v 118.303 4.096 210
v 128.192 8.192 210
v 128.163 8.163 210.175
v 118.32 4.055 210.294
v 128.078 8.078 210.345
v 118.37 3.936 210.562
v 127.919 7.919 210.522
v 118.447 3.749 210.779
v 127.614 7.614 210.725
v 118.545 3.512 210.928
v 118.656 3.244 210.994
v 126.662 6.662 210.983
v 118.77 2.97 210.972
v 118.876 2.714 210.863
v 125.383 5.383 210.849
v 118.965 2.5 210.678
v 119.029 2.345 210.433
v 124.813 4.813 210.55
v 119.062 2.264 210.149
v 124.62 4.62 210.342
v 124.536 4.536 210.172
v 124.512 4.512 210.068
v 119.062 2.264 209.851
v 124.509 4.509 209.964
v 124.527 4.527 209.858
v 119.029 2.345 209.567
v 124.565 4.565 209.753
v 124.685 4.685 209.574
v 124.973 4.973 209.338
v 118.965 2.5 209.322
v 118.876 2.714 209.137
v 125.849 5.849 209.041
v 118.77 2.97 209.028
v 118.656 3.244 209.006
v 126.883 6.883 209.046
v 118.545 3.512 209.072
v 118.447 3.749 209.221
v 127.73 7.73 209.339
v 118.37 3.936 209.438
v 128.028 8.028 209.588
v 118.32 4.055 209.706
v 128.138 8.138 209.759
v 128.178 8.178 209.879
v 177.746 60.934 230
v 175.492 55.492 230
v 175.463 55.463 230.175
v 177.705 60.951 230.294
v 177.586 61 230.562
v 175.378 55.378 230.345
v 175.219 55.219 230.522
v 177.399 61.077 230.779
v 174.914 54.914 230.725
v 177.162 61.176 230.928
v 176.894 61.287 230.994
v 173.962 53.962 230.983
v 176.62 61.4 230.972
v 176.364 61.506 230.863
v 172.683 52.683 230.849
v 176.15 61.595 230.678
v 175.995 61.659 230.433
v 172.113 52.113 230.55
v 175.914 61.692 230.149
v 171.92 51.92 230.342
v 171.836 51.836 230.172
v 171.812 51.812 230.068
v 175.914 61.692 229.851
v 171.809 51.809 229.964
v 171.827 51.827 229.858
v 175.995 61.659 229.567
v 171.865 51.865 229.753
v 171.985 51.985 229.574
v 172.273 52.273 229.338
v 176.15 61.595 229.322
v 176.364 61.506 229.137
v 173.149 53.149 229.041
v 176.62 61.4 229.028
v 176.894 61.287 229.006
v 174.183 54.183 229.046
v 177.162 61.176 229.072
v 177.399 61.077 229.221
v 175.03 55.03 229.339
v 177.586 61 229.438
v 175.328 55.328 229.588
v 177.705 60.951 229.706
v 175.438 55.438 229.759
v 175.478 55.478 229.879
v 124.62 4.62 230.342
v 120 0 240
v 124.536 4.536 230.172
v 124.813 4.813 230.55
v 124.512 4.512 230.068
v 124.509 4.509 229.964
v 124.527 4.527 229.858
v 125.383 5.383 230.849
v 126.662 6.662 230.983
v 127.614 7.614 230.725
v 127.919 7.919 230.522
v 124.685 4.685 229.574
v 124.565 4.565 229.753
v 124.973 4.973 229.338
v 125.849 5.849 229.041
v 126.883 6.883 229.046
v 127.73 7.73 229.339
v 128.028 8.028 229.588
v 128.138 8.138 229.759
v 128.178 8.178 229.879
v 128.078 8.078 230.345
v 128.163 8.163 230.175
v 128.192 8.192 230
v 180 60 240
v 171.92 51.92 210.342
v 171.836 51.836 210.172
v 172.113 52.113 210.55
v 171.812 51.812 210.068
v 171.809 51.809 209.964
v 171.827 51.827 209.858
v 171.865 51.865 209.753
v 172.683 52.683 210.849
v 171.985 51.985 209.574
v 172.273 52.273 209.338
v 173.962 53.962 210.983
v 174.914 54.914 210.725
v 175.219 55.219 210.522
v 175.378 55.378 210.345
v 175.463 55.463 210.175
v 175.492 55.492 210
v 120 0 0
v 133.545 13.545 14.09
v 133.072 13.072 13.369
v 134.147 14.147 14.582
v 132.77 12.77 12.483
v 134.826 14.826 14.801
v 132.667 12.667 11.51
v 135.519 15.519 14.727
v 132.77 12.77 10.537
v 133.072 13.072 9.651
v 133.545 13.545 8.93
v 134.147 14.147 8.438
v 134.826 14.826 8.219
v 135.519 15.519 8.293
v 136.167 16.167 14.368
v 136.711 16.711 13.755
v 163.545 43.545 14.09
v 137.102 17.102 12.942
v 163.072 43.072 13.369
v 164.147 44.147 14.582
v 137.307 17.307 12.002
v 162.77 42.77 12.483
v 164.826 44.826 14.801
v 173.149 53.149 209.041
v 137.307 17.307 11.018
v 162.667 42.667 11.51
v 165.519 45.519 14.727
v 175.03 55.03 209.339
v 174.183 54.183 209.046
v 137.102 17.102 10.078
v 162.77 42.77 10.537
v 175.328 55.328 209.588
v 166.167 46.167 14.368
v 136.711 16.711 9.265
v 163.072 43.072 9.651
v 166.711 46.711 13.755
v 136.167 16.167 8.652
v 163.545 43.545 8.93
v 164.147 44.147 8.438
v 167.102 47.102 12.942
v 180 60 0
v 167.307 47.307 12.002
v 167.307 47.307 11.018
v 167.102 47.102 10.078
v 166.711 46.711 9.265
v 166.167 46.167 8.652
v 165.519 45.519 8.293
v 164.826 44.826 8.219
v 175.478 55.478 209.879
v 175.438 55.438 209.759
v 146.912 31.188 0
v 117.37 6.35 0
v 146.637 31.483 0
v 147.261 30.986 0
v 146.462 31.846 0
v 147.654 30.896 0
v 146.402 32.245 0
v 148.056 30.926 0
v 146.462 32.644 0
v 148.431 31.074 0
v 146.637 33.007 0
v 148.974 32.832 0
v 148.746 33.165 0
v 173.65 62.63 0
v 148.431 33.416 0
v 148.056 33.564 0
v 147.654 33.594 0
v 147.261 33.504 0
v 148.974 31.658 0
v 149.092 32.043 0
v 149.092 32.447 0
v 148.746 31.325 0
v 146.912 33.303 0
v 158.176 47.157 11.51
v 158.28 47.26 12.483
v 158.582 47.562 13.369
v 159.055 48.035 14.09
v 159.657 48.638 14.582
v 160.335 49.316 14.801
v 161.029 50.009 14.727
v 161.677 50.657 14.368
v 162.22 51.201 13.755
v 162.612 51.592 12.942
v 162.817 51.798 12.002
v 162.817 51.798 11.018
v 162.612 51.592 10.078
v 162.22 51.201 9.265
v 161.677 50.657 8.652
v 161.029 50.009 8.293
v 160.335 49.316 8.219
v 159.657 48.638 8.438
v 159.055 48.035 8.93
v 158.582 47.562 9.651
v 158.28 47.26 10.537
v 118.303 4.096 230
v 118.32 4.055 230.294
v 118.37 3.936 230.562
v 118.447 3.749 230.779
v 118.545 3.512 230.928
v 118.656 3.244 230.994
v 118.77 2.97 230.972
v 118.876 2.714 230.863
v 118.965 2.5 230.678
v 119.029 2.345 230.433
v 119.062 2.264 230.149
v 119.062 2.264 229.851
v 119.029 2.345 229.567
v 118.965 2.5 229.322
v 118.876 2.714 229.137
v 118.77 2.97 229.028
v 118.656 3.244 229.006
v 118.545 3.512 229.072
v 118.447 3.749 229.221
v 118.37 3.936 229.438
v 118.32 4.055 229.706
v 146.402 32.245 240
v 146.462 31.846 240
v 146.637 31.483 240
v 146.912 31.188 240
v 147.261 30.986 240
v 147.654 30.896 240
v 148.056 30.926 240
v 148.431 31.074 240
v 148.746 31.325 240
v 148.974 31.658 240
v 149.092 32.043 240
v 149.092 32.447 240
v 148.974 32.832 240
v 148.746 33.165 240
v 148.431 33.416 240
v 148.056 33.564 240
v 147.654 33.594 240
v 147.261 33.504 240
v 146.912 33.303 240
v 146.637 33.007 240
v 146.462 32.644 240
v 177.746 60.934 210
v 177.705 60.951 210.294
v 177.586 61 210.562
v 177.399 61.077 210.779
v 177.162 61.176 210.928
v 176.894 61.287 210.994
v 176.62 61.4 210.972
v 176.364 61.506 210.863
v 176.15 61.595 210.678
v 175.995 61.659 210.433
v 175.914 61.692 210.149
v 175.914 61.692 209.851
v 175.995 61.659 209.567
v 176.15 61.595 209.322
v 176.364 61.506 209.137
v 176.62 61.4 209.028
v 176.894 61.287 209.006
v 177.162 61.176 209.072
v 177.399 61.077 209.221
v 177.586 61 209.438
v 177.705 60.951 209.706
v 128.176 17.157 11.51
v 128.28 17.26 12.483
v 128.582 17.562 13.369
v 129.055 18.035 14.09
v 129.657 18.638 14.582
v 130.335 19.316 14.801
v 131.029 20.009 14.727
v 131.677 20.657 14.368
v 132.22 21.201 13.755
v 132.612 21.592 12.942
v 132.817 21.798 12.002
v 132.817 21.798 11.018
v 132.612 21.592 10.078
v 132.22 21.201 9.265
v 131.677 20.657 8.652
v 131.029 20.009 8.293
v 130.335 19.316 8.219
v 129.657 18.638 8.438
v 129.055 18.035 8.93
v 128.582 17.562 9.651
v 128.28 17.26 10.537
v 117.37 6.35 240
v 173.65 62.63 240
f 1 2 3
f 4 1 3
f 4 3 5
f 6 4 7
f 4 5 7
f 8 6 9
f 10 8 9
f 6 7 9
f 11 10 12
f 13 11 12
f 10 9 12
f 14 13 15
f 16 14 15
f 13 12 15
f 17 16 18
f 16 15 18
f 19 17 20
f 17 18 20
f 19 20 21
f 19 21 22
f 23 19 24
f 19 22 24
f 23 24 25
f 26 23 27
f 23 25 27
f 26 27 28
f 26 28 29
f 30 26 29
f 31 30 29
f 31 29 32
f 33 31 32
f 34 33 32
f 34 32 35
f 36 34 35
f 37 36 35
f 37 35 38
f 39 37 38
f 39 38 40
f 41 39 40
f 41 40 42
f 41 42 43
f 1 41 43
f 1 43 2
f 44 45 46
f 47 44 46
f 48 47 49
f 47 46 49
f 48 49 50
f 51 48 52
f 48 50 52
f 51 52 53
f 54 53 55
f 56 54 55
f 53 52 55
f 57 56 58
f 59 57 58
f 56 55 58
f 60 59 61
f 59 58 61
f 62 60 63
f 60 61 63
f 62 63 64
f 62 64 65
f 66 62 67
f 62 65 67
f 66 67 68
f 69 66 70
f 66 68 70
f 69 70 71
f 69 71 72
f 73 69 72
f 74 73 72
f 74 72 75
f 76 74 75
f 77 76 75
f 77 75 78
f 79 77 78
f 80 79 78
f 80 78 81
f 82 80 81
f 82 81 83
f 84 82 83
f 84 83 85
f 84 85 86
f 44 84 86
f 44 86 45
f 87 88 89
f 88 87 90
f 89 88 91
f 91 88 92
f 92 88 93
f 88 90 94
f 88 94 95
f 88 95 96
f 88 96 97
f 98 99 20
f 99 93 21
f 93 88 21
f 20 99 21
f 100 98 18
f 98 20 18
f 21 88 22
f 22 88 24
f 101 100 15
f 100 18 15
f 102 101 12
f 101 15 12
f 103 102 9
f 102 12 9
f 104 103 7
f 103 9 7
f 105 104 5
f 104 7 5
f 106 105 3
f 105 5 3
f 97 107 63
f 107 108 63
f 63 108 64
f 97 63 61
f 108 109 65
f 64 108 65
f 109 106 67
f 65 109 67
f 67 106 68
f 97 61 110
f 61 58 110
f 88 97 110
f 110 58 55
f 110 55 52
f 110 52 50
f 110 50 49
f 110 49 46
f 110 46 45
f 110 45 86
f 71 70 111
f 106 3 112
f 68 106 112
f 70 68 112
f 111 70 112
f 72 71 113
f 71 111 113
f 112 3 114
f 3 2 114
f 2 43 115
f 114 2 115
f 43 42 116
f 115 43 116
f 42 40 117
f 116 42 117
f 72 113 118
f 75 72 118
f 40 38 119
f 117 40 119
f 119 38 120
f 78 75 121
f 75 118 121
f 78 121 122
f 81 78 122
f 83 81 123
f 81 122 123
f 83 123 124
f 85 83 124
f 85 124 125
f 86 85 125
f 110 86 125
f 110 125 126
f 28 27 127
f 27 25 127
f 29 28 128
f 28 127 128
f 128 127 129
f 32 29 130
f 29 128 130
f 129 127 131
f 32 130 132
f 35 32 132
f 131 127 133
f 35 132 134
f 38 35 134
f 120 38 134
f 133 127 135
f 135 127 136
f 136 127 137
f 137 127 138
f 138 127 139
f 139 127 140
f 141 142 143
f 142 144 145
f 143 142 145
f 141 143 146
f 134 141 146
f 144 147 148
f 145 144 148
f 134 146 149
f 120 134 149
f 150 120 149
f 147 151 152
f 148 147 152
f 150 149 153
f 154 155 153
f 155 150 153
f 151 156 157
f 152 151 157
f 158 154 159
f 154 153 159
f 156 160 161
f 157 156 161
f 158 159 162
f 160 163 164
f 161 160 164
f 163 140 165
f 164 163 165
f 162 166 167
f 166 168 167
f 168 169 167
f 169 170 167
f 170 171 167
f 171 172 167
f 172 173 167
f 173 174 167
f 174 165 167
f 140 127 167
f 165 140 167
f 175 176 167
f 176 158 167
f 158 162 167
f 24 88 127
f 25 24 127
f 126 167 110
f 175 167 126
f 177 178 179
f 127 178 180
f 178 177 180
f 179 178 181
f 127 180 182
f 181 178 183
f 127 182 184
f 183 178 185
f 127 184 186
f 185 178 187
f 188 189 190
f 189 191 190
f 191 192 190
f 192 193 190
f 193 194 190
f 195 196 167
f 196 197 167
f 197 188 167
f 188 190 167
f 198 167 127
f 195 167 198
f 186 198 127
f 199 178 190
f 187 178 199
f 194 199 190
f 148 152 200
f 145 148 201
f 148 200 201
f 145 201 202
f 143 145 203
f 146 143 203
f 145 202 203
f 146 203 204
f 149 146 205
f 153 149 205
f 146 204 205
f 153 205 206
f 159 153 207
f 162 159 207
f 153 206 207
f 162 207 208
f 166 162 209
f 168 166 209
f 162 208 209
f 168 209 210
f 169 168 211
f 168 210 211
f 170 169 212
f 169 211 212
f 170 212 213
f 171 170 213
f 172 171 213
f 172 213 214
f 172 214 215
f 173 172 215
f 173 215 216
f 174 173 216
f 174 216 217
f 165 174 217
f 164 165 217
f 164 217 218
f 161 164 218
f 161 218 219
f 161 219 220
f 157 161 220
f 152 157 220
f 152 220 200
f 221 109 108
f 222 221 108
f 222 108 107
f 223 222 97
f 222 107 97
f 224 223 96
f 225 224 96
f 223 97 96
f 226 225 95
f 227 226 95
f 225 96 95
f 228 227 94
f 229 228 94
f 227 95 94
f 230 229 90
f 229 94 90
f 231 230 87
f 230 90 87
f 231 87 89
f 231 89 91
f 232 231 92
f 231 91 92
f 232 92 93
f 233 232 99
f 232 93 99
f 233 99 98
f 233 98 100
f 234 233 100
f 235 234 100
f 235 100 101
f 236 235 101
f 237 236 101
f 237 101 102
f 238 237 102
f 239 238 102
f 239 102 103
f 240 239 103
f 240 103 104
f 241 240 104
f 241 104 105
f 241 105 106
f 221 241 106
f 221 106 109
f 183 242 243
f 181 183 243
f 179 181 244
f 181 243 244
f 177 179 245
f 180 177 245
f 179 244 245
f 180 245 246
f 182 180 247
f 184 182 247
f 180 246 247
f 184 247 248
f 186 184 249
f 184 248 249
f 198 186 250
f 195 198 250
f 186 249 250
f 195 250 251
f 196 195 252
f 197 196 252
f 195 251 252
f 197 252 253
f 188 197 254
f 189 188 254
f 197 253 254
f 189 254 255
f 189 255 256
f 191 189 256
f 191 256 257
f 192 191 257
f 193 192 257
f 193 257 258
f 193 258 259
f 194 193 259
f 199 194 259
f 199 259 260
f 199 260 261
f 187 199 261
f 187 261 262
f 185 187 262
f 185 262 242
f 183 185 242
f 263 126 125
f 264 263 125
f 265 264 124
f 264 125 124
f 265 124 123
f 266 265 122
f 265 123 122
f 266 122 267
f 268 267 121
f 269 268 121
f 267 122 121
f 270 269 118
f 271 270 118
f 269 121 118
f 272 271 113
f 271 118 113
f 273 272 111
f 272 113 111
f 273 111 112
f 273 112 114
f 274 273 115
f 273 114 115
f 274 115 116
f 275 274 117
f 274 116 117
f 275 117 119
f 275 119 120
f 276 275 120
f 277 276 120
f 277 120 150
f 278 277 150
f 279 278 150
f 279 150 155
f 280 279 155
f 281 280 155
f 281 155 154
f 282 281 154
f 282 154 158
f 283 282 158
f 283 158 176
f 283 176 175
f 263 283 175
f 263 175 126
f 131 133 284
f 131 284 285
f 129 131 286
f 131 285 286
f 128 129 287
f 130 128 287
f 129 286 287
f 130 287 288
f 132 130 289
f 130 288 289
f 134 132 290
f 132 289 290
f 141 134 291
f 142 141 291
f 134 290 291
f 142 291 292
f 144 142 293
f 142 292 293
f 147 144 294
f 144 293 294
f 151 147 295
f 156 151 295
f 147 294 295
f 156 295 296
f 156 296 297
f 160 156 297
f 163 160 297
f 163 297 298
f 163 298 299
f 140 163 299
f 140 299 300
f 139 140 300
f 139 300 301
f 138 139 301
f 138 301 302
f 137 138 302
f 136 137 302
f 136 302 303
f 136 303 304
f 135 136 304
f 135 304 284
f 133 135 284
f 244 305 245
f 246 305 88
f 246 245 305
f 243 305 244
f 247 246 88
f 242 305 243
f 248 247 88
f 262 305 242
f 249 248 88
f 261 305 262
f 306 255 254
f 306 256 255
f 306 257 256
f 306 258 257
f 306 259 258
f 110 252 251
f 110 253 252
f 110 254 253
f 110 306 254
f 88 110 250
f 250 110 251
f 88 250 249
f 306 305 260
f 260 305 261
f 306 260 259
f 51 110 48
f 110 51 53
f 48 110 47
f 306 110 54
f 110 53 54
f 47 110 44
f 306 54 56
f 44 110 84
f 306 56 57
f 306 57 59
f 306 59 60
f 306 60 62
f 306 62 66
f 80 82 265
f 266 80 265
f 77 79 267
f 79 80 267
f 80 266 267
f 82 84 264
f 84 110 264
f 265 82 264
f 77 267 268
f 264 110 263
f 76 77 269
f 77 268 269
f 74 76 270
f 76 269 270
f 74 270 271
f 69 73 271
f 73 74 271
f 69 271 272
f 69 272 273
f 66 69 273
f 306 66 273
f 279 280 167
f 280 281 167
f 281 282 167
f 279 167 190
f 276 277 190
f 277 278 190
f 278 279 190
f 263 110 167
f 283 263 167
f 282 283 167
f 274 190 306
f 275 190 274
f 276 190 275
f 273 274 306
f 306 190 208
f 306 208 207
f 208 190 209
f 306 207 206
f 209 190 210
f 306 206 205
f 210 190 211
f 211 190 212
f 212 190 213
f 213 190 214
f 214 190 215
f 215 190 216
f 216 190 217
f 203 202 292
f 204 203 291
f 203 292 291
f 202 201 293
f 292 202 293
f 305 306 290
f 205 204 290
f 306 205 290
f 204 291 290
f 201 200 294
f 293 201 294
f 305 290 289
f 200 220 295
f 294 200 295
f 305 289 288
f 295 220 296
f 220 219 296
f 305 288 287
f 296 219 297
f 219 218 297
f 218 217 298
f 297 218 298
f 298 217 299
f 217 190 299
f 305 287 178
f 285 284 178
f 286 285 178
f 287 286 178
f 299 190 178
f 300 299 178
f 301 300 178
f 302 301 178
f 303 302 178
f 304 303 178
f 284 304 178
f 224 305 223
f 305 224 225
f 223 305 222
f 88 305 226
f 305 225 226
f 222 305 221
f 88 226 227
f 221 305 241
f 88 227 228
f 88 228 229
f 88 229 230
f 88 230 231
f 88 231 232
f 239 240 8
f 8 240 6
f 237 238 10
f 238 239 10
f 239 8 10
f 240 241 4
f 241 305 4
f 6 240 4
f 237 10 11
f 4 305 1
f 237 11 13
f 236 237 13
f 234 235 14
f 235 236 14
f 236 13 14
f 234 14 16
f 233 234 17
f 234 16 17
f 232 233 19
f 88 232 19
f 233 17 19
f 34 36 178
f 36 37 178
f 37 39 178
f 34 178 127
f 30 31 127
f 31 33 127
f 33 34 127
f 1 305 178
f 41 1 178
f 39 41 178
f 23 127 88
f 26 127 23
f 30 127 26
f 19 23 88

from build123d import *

# Parameters (mm, degrees)
F1_DEPTH       = 240
F2_DEPTH       = 240
F3_DEPTH       = 240
F4_DEPTH       = 240
F9_D           = 6.6
F9_DEPTH       = 12
F9_TIP         = 1.9828400428
F9_ON_F5_D     = 6.6
F9_ON_F5_DEPTH = 12
F9_ON_F5_TIP   = 1.9828400428
F9_ON_F6_D     = 6.6
F9_ON_F6_DEPTH = 12
F9_ON_F6_TIP   = 1.9828400428
F9_ON_F7_D     = 6.6
F9_ON_F7_DEPTH = 12
F9_ON_F7_TIP   = 1.9828400428
F13_D          = 2.7051
F13_ON_F10_D   = 2.7051
F13_ON_F12_D   = 2.7051
F17_D          = 1.9939
F17_ON_F14_D   = 1.9939


with BuildPart() as f1:
    # F0 (on Top) → F1 (new body)
    with BuildSketch(Plane.XY):
        Polygon((-180, 60), (-120, 0), (-117.3697438789, 6.35), (-173.65, 62.6302561211), align=None)
    extrude(amount=F1_DEPTH)

    # F9 on F5
    with Locations(Plane(origin=(-60, -60, 0), x_dir=(0.7071067812, -0.7071067812, 0), z_dir=(-0.7071067812, -0.7071067812, 0))):
        with Locations((-106.066017178, 11.51), (-148.4924240492, 11.51)):
            Hole(F9_ON_F5_D / 2, depth=F9_ON_F5_DEPTH)
            with Locations((0, 0, -(F9_ON_F5_DEPTH + F9_ON_F5_TIP / 2))):  # 118° drill point
                Cone(0, F9_ON_F5_D / 2, F9_ON_F5_TIP, mode=Mode.SUBTRACT)

    # F13 on F10 (through all)
    with Locations(Plane(origin=(0, 0, 0), x_dir=(1, 0, 0), z_dir=(0, 0, -1))):
        with Locations((-147.7549359697, -32.2450640303)):
            Hole(F13_ON_F10_D / 2)


with BuildPart() as f2:
    # F0 (on Top) → F2 (new body)
    with BuildSketch(Plane.XY):
        Polygon((-120, 280), (-180, 220), (-173.65, 217.3697438789), (-117.3697438789, 273.65), align=None)
    extrude(amount=F2_DEPTH)

    # F9
    with Locations(Plane(origin=(-200, 200, 0), x_dir=(-0.7071067812, -0.7071067812, 0), z_dir=(-0.7071067812, 0.7071067812, 0))):
        with Locations((-91.9238815543, 11.51), (-49.4974746831, 11.51)):
            Hole(F9_D / 2, depth=F9_DEPTH)
            with Locations((0, 0, -(F9_DEPTH + F9_TIP / 2))):  # 118° drill point
                Cone(0, F9_D / 2, F9_TIP, mode=Mode.SUBTRACT)

    # F13 on F12 (through all)
    with Locations(Plane(origin=(0, 0, 0), x_dir=(1, 0, 0), z_dir=(0, 0, -1))):
        with Locations((-147.7549359697, -247.7549359697)):
            Hole(F13_ON_F12_D / 2)


with BuildPart() as f3:
    # F0 (on Top) → F3 (new body)
    with BuildSketch(Plane.XY):
        Polygon((173.65, 217.3697438789), (180, 220), (120, 280), (117.3697438789, 273.65), align=None)
    extrude(amount=F3_DEPTH)

    # F9 on F7
    with Locations(Plane(origin=(200, 200, 0), x_dir=(-0.7071067812, 0.7071067812, 0), z_dir=(0.7071067812, 0.7071067812, 0))):
        with Locations((49.4974746831, 11.51), (91.9238815543, 11.51)):
            Hole(F9_ON_F7_D / 2, depth=F9_ON_F7_DEPTH)
            with Locations((0, 0, -(F9_ON_F7_DEPTH + F9_ON_F7_TIP / 2))):  # 118° drill point
                Cone(0, F9_ON_F7_D / 2, F9_ON_F7_TIP, mode=Mode.SUBTRACT)


with BuildPart() as f4:
    # F0 (on Top) → F4 (new body)
    with BuildSketch(Plane.XY):
        Polygon((117.3697438789, 6.35), (120, 0), (180, 60), (173.65, 62.6302561211), align=None)
    extrude(amount=F4_DEPTH)

    # F9 on F6
    with Locations(Plane(origin=(60, -60, 0), x_dir=(0.7071067812, 0.7071067812, 0), z_dir=(0.7071067812, -0.7071067812, 0))):
        with Locations((148.4924240492, 11.51), (106.066017178, 11.51)):
            Hole(F9_ON_F6_D / 2, depth=F9_ON_F6_DEPTH)
            with Locations((0, 0, -(F9_ON_F6_DEPTH + F9_ON_F6_TIP / 2))):  # 118° drill point
                Cone(0, F9_ON_F6_D / 2, F9_ON_F6_TIP, mode=Mode.SUBTRACT)

    # F13 (through all)
    with Locations(Plane(origin=(0, 0, 0), x_dir=(1, 0, 0), z_dir=(0, 0, -1))):
        with Locations((147.7549359697, -32.2450640303)):
            Hole(F13_D / 2)

    # F17 (through all)
    with Locations(Plane(origin=(47.5735931288, 114.8528137424, 0), x_dir=(-0.9238795325, 0.3826834324, 0), z_dir=(0.3826834324, 0.9238795325, 0))):
        with Locations((-139.9007146742, 230), (-139.9007146742, 210)):
            Hole(F17_D / 2)

    # F17 on F14 (through all)
    with Locations(Plane(origin=(102.4264068712, 42.4264068712, 0), x_dir=(0.3826834324, -0.9238795325, 0), z_dir=(-0.9238795325, -0.3826834324, 0))):
        with Locations((42.4854166479, 230), (42.4854166479, 210)):
            Hole(F17_ON_F14_D / 2)


solid = f4.part
